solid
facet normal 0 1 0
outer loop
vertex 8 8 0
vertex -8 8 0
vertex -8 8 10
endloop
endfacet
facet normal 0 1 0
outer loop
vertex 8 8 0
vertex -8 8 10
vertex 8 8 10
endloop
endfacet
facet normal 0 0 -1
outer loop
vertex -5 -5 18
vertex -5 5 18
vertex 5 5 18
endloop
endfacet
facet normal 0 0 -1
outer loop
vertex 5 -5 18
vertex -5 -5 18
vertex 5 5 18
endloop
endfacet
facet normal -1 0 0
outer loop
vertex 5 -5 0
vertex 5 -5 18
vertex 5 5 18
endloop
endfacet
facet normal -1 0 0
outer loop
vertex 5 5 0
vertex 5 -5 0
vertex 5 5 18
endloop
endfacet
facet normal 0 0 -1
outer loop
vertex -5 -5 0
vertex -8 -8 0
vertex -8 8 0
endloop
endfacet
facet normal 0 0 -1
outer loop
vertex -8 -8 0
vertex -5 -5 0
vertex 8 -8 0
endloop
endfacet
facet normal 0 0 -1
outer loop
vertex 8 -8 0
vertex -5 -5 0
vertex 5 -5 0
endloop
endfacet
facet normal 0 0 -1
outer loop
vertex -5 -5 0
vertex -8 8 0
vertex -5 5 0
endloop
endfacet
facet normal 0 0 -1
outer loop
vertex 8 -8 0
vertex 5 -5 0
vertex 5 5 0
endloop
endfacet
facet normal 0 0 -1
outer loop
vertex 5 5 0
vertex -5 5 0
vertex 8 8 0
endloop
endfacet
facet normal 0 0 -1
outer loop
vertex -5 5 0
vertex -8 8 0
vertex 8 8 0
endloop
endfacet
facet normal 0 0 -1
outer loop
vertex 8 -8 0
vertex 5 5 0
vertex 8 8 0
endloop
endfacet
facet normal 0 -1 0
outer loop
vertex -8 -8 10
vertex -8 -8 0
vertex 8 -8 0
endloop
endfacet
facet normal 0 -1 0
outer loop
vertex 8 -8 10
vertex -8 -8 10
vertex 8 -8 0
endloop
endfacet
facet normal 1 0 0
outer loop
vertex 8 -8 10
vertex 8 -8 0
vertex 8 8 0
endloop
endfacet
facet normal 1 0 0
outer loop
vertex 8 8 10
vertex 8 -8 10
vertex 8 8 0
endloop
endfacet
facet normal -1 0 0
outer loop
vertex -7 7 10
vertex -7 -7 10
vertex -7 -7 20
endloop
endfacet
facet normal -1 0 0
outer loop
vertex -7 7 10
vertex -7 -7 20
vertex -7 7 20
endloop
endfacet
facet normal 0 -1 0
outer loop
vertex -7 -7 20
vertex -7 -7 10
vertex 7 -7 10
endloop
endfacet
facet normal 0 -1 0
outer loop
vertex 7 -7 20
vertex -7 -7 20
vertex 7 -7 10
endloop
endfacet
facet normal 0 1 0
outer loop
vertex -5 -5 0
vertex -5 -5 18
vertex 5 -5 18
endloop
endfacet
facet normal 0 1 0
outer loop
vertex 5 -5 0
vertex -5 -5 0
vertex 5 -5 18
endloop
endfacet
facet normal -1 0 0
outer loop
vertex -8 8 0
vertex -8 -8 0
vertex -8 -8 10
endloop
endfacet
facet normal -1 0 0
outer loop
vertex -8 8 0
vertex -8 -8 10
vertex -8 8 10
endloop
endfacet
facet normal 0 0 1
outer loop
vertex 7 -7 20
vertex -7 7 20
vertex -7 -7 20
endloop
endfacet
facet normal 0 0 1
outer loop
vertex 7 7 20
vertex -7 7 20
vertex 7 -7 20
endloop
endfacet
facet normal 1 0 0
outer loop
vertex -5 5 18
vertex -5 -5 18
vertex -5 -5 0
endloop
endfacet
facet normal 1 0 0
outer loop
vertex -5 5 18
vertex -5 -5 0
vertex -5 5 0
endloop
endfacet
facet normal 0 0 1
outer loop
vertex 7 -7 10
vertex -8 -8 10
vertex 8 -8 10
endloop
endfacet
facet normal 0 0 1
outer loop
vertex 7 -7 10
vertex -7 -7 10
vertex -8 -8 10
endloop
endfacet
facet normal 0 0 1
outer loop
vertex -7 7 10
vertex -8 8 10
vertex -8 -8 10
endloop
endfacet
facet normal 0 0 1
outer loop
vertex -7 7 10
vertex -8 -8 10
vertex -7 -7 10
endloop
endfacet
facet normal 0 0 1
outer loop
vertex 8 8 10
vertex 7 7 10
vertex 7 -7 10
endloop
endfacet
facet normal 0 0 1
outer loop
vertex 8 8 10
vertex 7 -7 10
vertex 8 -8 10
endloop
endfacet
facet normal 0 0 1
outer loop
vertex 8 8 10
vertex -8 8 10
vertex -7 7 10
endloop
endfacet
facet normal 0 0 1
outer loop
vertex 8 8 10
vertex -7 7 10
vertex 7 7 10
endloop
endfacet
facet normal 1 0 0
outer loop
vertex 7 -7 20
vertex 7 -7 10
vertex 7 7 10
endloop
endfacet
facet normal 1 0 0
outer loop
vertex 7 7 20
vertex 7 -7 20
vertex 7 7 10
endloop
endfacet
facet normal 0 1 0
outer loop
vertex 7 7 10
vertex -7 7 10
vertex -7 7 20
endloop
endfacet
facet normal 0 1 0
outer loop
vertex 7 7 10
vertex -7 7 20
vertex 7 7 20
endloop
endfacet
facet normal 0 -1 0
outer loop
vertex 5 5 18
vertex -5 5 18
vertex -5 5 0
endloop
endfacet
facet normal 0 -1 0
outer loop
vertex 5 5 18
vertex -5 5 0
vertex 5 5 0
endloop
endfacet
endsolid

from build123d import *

# Parameters (mm, degrees)
BOX002_W     = 10
BOX002_H     = 10
BOX002_DEPTH = 18
BOX001_W     = 14
BOX001_H     = 14
BOX001_DEPTH = 10
BOX_W        = 16
BOX_H        = 16
BOX_DEPTH    = 10


with BuildPart() as cube002:
    # Box002 → Box002 (new body)
    with BuildSketch(Plane(origin=(-5, -5, 0), x_dir=(1, 0, 0), z_dir=(0, 0, 1))):
        with Locations((5, 5)):
            Rectangle(BOX002_W, BOX002_H)
    extrude(amount=BOX002_DEPTH)


with BuildPart() as cube001:
    # Box001 → Box001 (new body)
    with BuildSketch(Plane(origin=(-7, -7, 10), x_dir=(1, 0, 0), z_dir=(0, 0, 1))):
        with Locations((7, 7)):
            Rectangle(BOX001_W, BOX001_H)
    extrude(amount=BOX001_DEPTH)


with BuildPart() as cut:
    # Box → Box (new body)
    with BuildSketch(Plane(origin=(-8, -8, 0), x_dir=(1, 0, 0), z_dir=(0, 0, 1))):
        with Locations((8, 8)):
            Rectangle(BOX_W, BOX_H)
    extrude(amount=BOX_DEPTH)

    # Fusion: union Cube001
    add(cube001.part)

    # Cut: cut Cube002
    add(cube002.part, mode=Mode.SUBTRACT)


solid = cut.part
